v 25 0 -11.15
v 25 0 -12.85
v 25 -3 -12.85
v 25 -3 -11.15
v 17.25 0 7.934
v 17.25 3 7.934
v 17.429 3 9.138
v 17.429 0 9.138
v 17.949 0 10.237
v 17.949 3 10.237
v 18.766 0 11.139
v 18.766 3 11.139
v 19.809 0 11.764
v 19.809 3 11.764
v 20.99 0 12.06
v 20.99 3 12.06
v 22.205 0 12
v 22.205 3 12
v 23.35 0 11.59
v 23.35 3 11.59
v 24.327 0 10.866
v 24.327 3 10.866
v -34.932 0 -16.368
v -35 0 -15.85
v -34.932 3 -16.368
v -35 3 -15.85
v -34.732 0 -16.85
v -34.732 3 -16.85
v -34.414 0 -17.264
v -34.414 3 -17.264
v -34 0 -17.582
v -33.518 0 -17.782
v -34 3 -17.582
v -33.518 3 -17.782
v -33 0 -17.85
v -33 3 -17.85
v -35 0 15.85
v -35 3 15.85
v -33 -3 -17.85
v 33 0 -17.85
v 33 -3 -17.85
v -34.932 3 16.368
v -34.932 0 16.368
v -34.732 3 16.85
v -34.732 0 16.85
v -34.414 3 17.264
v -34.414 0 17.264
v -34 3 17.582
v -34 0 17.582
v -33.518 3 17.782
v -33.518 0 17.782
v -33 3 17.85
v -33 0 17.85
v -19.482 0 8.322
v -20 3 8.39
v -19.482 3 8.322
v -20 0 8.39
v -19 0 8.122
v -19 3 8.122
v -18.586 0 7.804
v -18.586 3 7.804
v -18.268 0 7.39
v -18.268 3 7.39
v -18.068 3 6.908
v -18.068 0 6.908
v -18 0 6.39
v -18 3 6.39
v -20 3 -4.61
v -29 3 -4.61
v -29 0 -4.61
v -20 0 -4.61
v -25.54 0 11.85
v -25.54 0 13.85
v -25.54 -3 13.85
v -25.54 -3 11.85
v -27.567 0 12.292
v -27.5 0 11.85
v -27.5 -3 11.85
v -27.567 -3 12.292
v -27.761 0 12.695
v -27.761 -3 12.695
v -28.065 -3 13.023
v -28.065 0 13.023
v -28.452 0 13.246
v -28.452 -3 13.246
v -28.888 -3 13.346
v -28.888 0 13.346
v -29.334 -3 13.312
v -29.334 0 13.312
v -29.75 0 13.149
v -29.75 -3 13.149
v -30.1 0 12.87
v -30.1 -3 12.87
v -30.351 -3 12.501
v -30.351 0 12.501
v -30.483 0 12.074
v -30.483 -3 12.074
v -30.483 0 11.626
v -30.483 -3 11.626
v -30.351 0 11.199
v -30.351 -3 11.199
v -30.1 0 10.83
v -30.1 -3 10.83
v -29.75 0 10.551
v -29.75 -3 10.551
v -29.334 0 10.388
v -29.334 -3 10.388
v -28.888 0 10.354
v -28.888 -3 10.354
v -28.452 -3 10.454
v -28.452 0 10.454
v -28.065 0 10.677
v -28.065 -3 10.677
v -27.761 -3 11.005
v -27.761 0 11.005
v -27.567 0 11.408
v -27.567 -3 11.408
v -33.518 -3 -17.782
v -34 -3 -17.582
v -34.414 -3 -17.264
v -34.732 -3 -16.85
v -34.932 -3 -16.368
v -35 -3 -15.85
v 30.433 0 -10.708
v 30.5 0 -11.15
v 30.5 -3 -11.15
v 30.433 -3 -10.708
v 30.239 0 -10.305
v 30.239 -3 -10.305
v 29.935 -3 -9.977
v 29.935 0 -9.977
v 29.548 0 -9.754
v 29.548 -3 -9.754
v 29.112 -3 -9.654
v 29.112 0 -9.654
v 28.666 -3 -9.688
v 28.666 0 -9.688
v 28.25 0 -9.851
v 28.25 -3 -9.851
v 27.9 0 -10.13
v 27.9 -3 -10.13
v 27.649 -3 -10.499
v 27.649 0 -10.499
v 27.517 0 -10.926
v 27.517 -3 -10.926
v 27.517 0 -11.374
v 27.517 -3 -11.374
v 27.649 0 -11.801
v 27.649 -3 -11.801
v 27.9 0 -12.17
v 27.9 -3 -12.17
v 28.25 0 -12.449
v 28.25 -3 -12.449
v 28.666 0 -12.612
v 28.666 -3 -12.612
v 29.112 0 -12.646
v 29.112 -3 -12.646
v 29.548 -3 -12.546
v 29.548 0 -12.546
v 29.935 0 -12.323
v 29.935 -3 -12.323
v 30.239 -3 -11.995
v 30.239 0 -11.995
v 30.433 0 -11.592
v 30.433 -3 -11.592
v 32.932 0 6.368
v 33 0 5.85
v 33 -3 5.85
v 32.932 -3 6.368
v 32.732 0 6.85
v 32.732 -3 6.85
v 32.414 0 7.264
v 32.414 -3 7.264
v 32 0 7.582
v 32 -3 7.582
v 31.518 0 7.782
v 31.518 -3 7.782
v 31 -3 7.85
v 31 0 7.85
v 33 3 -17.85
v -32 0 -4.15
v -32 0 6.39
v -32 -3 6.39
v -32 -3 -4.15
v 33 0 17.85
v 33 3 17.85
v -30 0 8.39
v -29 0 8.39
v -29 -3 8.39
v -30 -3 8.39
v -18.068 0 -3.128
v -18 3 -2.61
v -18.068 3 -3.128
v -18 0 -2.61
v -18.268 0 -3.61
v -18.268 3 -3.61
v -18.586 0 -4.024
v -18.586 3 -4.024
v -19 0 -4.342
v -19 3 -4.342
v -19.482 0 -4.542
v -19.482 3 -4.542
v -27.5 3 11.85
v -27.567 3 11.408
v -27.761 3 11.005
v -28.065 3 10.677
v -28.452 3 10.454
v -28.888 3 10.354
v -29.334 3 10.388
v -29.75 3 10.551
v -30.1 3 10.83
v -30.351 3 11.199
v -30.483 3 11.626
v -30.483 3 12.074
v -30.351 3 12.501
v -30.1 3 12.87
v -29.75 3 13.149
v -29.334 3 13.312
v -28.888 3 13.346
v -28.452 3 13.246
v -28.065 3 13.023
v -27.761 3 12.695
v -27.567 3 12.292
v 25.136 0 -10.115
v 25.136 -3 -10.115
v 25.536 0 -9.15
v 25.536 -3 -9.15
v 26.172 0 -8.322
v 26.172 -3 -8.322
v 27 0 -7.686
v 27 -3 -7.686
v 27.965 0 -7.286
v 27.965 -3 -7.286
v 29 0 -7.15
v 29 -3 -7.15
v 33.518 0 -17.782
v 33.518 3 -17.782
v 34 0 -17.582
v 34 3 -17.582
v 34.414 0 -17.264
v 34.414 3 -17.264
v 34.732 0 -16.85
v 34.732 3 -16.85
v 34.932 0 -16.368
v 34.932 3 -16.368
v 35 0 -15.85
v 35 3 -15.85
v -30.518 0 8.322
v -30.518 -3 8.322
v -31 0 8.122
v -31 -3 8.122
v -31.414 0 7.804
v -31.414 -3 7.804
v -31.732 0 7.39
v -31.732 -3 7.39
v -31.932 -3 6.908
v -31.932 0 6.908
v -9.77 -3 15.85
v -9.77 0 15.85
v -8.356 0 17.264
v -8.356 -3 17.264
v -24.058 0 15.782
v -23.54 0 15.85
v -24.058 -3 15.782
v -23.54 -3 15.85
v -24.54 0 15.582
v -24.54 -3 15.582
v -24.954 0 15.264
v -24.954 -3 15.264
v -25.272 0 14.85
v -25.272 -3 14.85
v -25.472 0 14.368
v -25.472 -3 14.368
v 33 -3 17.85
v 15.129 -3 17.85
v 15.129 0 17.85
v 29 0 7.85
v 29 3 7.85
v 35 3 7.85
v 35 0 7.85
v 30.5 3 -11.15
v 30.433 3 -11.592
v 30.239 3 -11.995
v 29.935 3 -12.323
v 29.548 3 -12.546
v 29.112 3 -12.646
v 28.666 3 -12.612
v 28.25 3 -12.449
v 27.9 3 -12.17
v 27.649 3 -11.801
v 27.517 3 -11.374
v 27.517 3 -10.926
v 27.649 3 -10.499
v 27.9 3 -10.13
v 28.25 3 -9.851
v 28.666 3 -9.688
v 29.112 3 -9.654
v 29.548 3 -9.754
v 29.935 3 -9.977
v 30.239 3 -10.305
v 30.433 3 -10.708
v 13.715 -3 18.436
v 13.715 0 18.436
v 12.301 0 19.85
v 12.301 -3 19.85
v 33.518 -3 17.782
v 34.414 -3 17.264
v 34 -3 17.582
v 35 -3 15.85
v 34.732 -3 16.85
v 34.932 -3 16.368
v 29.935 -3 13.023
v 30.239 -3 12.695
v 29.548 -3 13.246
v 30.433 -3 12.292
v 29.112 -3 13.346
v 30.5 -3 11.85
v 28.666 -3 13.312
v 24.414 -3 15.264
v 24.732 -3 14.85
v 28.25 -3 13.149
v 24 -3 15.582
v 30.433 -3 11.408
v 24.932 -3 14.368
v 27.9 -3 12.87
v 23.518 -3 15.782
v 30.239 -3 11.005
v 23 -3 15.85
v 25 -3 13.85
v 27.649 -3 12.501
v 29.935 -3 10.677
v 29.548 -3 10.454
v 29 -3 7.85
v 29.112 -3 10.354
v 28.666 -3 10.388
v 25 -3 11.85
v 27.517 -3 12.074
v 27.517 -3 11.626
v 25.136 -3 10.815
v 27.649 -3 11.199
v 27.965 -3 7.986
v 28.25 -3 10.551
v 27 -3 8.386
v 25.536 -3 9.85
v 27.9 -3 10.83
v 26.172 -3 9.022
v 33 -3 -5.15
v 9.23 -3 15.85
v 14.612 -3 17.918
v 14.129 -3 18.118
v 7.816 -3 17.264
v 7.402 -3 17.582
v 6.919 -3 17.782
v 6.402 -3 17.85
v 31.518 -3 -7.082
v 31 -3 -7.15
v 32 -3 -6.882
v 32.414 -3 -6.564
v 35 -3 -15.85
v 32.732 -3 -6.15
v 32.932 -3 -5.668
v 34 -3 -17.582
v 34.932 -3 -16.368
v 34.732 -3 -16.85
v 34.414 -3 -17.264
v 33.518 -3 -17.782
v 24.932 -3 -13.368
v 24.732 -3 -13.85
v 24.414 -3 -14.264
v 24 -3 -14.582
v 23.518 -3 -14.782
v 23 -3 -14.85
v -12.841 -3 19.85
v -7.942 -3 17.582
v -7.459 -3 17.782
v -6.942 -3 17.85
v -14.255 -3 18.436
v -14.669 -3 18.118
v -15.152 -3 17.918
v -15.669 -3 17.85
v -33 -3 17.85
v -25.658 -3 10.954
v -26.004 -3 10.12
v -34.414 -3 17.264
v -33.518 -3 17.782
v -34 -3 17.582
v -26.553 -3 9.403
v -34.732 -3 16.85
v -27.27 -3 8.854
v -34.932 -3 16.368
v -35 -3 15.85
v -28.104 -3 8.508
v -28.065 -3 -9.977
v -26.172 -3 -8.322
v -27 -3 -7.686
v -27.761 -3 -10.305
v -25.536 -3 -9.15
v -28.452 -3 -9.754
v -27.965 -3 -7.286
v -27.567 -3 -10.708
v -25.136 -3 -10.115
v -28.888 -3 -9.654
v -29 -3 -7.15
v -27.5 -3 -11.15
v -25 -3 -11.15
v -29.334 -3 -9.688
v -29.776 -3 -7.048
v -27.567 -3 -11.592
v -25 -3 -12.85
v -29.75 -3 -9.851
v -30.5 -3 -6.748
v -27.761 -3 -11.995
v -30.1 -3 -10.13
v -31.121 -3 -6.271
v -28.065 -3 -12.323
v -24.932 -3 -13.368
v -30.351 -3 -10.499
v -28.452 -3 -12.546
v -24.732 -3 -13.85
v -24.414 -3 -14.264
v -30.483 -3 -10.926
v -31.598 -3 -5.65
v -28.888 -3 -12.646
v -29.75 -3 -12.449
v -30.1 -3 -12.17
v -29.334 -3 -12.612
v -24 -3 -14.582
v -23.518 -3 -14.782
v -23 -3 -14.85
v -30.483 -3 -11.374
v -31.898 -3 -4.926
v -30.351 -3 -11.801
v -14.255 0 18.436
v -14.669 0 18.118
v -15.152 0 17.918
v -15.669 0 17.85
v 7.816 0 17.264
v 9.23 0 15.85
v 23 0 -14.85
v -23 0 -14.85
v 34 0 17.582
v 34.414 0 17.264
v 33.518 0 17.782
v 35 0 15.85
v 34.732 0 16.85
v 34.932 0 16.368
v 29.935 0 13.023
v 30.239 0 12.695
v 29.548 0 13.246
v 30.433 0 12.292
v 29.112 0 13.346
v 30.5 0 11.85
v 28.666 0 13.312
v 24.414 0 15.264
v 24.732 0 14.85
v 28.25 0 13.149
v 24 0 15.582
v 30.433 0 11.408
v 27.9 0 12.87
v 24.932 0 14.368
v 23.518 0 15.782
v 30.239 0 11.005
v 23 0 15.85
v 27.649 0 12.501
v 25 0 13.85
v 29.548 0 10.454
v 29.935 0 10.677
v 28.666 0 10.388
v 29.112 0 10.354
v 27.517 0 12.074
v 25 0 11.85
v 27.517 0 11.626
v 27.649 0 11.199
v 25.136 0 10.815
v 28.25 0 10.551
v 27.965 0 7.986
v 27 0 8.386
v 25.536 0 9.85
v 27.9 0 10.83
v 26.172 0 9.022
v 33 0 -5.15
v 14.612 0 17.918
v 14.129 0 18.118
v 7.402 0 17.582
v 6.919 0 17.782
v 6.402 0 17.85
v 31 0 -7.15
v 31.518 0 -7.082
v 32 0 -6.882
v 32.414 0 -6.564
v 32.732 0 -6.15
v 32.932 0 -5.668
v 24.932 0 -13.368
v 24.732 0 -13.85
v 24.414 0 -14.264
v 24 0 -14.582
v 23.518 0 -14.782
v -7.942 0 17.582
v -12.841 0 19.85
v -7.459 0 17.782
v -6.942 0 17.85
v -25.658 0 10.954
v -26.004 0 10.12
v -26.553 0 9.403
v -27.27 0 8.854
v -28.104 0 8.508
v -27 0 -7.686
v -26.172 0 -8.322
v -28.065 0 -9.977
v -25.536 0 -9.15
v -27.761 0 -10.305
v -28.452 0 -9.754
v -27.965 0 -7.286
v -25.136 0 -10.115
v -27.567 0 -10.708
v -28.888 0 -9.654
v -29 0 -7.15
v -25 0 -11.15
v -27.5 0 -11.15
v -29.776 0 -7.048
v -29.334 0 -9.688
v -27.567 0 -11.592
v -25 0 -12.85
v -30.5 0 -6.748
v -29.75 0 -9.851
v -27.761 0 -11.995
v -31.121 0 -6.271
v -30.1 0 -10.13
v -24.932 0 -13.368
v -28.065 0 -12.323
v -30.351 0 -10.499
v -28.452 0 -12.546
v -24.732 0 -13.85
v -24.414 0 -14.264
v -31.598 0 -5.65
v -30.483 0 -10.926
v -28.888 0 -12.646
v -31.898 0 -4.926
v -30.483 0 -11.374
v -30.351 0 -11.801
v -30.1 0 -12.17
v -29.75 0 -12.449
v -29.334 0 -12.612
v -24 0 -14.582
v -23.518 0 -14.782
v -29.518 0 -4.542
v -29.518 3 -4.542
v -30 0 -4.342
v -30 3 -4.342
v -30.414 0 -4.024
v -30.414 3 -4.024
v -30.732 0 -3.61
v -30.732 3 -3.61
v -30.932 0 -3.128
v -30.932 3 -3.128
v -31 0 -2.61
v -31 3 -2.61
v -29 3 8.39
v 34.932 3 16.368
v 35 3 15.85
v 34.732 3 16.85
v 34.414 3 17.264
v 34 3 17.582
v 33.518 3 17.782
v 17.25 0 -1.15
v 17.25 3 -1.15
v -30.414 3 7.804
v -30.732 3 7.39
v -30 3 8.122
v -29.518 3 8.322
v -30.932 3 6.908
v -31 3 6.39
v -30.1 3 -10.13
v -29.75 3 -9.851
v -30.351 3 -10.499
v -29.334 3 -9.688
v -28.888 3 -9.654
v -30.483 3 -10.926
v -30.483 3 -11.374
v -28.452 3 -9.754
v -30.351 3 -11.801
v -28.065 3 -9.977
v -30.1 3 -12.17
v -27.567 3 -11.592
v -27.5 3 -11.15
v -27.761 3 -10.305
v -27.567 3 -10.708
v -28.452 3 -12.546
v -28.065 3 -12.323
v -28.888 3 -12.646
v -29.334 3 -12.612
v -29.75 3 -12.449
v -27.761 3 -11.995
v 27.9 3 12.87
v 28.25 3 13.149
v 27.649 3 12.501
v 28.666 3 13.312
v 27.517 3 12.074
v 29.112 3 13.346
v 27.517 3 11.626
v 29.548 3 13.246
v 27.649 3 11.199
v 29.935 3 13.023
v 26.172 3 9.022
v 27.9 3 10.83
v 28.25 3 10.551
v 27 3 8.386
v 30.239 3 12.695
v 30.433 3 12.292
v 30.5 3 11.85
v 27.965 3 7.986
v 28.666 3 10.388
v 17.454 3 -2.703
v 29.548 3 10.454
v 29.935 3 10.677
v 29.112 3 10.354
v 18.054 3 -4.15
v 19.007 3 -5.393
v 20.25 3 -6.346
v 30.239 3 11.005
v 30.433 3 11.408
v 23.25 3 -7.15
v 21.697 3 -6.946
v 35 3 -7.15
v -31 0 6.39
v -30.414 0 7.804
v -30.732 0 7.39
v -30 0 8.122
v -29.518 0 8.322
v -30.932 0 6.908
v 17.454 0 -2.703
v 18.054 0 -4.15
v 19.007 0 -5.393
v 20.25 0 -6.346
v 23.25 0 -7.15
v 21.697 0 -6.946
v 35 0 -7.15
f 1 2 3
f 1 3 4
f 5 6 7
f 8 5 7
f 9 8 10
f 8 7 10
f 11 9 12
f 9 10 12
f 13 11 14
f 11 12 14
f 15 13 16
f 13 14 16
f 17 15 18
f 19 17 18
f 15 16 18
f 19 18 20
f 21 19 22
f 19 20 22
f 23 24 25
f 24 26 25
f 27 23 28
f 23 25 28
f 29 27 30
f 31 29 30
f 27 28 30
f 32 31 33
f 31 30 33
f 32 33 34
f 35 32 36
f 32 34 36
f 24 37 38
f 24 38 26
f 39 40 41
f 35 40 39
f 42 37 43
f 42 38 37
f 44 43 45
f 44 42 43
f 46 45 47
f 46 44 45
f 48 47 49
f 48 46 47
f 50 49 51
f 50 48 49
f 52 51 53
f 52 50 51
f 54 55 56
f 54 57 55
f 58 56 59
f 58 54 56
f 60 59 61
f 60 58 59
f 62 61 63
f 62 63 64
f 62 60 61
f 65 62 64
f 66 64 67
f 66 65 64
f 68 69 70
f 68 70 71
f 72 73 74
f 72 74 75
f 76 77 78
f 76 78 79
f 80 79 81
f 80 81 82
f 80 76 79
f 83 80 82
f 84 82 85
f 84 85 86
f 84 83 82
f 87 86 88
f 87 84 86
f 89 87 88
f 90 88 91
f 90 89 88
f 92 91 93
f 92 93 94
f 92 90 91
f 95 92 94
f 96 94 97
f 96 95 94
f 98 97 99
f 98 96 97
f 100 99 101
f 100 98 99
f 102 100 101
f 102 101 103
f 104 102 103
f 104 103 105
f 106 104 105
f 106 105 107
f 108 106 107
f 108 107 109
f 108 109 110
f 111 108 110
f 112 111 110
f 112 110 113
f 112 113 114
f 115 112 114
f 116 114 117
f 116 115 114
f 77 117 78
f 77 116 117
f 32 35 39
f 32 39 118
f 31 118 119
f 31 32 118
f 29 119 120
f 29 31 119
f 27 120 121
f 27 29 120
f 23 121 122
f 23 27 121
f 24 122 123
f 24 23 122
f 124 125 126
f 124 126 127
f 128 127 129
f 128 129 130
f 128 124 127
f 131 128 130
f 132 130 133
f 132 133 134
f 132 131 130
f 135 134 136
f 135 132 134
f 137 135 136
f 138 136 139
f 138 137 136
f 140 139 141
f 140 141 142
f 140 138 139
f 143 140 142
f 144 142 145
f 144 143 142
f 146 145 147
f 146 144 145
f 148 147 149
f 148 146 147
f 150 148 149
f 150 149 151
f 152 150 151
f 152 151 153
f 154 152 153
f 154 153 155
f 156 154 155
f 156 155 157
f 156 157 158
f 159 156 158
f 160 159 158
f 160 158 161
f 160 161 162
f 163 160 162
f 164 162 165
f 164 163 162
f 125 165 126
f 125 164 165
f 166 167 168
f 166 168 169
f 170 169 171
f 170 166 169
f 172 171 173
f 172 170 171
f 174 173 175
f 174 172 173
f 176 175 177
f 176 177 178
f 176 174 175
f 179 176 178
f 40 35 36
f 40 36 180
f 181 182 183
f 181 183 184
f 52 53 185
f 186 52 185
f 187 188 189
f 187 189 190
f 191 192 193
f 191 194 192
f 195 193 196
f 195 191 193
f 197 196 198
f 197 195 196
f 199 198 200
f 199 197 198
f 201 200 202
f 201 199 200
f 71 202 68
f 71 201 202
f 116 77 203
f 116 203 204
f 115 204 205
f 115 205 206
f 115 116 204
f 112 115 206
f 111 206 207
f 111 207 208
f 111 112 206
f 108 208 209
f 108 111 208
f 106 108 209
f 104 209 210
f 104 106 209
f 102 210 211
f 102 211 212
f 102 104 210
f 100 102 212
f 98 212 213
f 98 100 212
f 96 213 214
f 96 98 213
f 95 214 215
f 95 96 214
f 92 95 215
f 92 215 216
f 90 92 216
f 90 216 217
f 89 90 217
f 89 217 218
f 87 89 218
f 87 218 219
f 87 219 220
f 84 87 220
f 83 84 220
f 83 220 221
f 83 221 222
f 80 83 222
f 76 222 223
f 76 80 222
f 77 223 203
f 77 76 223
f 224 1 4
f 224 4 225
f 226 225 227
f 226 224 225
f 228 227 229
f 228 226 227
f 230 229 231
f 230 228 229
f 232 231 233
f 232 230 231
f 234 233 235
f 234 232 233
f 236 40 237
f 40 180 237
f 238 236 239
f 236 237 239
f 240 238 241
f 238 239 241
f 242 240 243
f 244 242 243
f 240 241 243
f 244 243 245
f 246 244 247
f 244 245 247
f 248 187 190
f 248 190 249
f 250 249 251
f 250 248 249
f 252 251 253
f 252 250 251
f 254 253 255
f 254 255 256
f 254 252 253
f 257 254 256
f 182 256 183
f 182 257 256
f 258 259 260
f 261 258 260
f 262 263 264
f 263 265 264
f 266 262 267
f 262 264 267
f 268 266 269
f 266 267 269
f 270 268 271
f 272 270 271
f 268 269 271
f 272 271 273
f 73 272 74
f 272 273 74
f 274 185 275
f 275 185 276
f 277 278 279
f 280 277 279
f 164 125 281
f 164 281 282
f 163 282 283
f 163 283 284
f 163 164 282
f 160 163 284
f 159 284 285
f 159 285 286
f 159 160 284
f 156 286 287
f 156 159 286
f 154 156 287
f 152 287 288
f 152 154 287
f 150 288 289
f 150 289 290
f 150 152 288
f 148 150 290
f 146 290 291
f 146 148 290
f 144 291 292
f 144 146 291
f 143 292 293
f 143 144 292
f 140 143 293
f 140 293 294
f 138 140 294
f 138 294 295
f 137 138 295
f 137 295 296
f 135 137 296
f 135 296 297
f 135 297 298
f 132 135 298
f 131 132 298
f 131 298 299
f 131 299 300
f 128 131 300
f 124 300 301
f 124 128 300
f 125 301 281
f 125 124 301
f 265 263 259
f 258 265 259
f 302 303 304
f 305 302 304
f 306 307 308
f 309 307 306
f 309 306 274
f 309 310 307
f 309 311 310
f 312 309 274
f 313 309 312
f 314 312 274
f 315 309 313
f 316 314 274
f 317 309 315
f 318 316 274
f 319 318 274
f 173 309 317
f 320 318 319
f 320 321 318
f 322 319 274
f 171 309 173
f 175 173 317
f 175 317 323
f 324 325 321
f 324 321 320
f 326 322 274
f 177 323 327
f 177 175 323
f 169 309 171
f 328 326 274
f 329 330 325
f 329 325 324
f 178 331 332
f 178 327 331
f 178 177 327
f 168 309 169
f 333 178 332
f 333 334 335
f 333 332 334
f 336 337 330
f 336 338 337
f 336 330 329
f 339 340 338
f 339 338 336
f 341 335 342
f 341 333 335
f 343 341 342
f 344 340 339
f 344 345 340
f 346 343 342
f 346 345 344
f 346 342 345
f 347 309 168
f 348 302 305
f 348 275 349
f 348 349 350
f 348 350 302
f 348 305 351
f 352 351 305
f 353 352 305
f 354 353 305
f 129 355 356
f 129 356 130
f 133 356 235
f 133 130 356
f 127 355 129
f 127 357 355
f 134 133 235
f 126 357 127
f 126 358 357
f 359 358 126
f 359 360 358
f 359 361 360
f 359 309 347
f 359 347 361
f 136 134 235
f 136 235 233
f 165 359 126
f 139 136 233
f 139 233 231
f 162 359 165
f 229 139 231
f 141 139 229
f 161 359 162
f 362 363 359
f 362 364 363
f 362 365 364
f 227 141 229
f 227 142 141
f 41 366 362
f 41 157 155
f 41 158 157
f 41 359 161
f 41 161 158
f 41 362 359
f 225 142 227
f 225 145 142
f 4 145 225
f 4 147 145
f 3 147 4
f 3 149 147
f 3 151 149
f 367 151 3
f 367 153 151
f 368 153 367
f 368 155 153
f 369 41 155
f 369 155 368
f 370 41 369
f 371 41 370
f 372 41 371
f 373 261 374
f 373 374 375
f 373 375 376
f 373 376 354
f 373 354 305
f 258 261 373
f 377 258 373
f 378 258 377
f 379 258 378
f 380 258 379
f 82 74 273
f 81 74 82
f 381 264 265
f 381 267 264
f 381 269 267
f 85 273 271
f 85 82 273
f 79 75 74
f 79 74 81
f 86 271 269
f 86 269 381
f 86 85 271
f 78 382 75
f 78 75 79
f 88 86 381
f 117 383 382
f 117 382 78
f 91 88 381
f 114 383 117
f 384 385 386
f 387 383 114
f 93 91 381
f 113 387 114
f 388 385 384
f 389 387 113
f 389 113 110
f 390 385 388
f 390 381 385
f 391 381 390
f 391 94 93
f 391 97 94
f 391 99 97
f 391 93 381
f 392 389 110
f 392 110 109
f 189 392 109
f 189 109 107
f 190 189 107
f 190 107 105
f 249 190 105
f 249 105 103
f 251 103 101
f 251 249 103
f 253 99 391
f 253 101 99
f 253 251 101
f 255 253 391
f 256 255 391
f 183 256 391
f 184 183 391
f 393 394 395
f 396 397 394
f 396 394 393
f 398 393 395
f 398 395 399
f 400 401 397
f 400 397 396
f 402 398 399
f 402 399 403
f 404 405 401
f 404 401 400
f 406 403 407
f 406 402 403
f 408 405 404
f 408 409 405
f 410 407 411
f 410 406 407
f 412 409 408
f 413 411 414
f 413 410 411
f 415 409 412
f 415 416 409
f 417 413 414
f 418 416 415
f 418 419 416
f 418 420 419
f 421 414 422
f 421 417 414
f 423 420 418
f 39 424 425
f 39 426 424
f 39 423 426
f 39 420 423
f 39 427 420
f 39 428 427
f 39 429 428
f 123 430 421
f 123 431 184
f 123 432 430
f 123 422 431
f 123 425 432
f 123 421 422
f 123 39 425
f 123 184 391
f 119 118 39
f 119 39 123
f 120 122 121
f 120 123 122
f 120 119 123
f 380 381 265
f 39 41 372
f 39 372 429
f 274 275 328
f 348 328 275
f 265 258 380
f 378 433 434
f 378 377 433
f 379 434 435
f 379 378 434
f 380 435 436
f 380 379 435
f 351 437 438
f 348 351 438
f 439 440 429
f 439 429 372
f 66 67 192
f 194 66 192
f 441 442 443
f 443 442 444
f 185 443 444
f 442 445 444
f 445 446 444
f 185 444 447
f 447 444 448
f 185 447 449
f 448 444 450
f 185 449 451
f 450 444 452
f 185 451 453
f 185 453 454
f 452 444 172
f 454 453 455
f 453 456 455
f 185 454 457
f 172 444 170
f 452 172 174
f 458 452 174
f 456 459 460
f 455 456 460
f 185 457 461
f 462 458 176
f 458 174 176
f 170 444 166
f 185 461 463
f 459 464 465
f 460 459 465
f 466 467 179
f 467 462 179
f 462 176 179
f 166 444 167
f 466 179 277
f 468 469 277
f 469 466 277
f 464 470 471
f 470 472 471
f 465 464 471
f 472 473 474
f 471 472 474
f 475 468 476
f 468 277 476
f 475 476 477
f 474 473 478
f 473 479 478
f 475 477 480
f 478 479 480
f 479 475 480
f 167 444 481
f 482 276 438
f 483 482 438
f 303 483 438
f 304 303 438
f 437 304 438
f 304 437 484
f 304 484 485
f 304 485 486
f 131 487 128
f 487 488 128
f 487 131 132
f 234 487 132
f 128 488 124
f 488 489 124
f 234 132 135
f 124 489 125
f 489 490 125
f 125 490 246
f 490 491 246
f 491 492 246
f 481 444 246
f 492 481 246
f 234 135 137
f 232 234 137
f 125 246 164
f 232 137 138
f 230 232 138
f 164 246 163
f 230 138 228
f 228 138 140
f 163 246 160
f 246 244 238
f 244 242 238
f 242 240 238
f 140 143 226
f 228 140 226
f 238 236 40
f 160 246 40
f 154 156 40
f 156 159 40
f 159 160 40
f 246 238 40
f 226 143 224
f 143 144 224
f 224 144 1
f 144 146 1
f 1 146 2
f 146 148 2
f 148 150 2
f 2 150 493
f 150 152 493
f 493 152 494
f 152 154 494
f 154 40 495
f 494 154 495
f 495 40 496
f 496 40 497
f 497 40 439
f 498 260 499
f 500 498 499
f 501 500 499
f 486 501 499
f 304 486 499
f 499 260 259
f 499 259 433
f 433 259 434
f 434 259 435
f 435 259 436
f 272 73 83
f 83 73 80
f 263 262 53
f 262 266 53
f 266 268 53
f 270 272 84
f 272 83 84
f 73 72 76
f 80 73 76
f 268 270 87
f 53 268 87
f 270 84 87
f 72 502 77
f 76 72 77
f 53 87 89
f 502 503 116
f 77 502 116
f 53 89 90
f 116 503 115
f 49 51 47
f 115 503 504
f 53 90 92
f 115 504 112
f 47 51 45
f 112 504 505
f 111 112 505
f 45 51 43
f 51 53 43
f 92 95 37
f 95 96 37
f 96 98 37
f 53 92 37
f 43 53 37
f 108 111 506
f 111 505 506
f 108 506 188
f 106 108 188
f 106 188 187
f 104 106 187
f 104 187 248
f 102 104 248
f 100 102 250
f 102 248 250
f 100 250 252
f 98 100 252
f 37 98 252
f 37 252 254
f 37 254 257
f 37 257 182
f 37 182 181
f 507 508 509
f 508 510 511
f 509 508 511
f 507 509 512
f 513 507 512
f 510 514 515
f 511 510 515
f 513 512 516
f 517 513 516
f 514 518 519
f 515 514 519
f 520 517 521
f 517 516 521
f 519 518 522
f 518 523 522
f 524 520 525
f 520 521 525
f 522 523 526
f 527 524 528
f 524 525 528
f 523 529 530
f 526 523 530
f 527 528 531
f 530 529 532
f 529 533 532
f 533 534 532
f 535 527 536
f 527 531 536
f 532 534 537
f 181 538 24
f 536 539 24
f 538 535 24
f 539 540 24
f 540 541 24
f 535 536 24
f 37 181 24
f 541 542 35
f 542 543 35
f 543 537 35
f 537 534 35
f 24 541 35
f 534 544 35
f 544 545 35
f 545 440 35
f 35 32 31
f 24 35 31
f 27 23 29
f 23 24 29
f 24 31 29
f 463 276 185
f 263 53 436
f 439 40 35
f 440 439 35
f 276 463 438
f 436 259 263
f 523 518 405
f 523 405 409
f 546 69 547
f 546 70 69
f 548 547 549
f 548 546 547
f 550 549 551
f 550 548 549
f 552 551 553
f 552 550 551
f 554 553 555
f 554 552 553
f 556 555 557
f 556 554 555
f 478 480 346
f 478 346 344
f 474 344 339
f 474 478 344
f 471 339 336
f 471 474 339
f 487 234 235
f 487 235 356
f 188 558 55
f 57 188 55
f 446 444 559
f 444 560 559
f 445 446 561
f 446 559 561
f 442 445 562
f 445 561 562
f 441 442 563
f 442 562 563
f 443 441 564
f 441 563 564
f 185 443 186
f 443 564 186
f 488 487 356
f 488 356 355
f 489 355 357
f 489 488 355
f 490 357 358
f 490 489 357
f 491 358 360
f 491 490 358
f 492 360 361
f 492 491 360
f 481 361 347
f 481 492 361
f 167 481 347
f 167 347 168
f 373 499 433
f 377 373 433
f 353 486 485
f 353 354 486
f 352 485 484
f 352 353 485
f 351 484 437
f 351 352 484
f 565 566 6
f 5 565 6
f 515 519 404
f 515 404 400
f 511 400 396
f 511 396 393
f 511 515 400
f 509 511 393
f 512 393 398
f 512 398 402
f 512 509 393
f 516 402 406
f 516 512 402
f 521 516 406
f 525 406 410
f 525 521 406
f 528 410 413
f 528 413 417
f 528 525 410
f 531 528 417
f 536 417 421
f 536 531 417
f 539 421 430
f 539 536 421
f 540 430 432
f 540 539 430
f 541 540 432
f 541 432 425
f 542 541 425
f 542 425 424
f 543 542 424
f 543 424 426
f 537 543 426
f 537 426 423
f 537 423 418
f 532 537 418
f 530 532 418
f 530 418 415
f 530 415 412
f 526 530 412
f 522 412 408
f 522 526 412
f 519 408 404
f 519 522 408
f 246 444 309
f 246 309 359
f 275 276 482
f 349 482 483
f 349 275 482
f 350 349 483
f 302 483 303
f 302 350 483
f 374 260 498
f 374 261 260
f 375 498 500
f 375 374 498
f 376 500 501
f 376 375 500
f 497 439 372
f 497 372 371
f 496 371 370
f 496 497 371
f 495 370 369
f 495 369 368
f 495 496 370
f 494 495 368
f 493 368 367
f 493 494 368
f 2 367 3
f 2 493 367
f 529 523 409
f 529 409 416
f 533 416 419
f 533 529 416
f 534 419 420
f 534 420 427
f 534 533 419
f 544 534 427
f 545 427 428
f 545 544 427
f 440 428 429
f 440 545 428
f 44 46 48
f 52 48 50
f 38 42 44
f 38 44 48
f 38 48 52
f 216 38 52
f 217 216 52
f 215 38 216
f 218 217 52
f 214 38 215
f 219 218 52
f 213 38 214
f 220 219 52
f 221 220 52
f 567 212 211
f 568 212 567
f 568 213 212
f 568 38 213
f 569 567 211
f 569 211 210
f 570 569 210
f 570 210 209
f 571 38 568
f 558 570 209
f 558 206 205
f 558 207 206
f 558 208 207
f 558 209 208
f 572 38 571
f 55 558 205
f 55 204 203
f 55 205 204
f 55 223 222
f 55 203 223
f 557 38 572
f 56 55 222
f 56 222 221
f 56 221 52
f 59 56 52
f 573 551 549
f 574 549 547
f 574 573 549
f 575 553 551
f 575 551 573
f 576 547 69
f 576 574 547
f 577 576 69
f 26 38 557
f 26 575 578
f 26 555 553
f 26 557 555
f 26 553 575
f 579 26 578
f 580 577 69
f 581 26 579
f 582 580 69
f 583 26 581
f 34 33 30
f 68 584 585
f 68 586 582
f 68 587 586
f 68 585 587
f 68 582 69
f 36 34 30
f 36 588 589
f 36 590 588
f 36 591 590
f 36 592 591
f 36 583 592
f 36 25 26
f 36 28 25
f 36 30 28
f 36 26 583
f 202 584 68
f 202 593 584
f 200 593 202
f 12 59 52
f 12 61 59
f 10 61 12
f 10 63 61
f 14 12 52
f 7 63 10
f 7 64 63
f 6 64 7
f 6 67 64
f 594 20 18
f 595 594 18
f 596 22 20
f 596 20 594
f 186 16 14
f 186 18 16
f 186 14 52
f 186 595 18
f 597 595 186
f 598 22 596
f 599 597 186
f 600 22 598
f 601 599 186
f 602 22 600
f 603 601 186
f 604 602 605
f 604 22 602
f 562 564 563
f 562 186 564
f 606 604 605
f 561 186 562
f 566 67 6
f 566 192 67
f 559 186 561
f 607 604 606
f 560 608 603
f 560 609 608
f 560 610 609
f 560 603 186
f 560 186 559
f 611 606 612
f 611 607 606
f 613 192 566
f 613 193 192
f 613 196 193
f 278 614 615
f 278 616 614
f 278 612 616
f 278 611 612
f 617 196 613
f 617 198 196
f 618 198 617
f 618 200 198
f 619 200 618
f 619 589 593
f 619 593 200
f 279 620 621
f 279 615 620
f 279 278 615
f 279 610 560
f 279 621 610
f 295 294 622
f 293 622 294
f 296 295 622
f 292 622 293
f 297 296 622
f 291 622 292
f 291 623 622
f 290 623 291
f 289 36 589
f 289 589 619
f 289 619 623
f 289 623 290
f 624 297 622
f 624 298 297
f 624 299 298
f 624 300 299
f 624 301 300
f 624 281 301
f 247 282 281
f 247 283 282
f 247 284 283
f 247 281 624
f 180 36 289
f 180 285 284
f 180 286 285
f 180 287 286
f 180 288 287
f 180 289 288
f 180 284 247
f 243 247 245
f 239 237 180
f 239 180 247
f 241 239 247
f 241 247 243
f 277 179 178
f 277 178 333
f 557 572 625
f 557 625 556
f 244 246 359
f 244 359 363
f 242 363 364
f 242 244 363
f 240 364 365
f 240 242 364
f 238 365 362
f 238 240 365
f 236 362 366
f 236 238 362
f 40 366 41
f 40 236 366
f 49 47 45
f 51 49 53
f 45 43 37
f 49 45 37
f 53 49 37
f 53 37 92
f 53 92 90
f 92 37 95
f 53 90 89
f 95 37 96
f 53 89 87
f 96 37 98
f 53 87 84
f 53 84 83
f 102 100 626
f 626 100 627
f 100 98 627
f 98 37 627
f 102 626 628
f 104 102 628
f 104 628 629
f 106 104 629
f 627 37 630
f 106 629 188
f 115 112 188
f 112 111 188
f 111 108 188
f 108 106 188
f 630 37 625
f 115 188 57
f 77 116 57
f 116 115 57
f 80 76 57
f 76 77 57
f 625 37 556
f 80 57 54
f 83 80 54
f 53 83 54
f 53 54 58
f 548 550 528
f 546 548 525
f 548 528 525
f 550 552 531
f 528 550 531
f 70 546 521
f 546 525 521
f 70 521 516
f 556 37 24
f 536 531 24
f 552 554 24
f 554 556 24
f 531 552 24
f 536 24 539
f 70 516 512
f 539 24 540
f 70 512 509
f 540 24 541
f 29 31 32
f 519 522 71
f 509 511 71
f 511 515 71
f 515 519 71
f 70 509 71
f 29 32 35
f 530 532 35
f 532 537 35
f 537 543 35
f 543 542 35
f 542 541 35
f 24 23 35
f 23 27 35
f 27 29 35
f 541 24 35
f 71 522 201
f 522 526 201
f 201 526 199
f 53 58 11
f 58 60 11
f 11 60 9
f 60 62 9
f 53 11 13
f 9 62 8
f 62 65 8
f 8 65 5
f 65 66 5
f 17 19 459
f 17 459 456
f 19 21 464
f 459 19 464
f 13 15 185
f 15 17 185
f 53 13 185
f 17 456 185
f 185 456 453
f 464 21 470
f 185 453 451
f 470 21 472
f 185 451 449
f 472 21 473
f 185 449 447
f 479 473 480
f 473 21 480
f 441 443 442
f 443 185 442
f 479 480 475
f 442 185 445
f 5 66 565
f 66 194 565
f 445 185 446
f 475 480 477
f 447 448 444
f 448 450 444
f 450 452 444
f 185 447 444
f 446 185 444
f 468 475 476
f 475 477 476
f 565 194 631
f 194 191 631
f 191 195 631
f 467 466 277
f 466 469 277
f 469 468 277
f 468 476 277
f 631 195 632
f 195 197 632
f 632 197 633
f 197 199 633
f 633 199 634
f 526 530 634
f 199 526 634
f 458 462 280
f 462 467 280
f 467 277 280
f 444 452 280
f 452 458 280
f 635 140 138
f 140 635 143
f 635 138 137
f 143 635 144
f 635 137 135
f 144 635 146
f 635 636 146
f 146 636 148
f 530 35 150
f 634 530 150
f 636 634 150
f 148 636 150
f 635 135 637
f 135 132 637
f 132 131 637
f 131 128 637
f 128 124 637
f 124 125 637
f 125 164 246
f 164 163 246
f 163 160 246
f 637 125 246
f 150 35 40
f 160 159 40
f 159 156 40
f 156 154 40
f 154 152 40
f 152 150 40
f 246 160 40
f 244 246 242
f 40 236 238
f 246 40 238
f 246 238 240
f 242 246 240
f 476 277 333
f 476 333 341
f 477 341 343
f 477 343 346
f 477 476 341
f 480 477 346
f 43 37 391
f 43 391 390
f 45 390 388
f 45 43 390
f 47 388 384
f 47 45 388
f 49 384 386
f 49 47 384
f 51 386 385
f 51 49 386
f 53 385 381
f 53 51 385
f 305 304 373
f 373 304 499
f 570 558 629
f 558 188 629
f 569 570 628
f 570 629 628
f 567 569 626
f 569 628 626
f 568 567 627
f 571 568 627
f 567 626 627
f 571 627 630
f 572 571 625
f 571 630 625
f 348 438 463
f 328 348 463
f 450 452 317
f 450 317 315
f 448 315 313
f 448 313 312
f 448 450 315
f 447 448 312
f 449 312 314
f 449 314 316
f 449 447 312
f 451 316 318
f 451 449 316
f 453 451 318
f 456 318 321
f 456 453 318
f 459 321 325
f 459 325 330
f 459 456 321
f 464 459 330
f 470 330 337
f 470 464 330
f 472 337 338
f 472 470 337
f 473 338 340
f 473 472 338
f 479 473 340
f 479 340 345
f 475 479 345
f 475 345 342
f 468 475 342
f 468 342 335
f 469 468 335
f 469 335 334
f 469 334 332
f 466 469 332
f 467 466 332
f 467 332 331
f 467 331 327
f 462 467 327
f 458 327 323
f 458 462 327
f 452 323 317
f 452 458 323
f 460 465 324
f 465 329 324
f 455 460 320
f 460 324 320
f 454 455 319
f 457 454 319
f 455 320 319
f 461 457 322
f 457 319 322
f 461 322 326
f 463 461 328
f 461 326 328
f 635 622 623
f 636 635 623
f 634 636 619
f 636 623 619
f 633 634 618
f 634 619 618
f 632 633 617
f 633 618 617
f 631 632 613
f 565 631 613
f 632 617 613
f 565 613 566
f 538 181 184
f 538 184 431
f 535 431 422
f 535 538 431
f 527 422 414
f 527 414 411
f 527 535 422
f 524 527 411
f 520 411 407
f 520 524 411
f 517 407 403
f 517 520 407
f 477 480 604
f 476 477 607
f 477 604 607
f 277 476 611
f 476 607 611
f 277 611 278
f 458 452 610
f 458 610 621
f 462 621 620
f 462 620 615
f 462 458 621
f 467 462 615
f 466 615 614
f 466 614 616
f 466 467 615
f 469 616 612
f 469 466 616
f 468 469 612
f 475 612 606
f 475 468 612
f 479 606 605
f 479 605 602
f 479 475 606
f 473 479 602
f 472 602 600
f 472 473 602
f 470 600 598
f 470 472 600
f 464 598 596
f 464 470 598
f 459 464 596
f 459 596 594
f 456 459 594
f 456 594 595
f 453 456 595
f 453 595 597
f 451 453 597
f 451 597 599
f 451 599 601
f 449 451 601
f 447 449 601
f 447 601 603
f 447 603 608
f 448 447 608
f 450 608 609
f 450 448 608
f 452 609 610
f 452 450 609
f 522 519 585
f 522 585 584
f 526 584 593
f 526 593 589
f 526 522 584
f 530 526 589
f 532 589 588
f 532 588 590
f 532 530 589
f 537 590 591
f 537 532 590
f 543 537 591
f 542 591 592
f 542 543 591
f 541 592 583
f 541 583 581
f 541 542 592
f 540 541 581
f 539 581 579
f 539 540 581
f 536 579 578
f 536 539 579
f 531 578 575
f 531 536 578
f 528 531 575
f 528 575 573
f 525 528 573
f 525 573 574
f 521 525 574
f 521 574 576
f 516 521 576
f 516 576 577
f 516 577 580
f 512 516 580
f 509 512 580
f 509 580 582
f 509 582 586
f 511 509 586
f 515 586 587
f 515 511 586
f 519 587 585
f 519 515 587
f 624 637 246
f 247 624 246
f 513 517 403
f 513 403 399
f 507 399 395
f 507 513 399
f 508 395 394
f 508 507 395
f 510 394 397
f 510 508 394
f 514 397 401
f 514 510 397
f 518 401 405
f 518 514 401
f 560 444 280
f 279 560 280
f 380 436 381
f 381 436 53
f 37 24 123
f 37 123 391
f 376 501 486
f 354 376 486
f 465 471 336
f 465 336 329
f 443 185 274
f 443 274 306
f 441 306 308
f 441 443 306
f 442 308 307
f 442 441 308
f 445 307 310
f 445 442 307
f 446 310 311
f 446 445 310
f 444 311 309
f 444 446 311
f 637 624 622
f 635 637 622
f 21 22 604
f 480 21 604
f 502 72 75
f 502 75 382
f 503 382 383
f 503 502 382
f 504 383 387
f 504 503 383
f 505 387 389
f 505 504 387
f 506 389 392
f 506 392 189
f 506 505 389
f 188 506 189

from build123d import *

# Parameters (mm, degrees)
SKETCH1_W           = 70
SKETCH1_H           = 35.7
SKETCH1_R           = 1.5
BOSS_EXTRUDE1_DEPTH = 3
SKETCH2_W           = 13
SKETCH2_H           = 13
CUT_EXTRUDE1_DEPTH  = 4
FILLET1_R           = 2
FILLET2_R           = 2
SKETCH3_R           = 1.5
BOSS_EXTRUDE2_DEPTH = 3
BOSS_EXTRUDE3_DEPTH = 3
FILLET3_R           = 2
FILLET4_R           = 2


with BuildPart() as part:
    # Sketch1 → Boss-Extrude1 (new body)
    with BuildSketch(Plane(origin=(0, 0, 0), x_dir=(1, 0, 0), z_dir=(0, 1, 0))):
        Rectangle(SKETCH1_W, SKETCH1_H)
        with Locations((-29, -11.85)):
            Circle(SKETCH1_R, mode=Mode.SUBTRACT)
        with Locations((29, -11.85)):
            Circle(SKETCH1_R, mode=Mode.SUBTRACT)
        with Locations((29, 11.15)):
            Circle(SKETCH1_R, mode=Mode.SUBTRACT)
        with Locations((-29, 11.15)):
            Circle(SKETCH1_R, mode=Mode.SUBTRACT)
    extrude(amount=BOSS_EXTRUDE1_DEPTH)

    # Sketch2 → Cut-Extrude1 (cut, through all)
    with BuildSketch(Plane(origin=(0, 3, 0), x_dir=(1, 0, 0), z_dir=(0, 1, 0))):
        with Locations((-24.5, -1.89)):
            Rectangle(SKETCH2_W, SKETCH2_H)
        with BuildLine():
            Line((17.25, 1.15), (17.25, -7.934129881))
            ThreePointArc((17.25, -7.934129881), (19.809314312, -11.764414428), (24.327442995, -10.865702756))
            Line((24.327442995, -10.865702756), (26.171572875, -9.021572875))
            ThreePointArc((26.171572875, -9.021572875), (27.469266271, -8.15448187), (29, -7.85))
            Line((29, -7.85), (35, -7.85))
            Line((35, -7.85), (35, 7.15))
            Line((35, 7.15), (23.25, 7.15))
            ThreePointArc((23.25, 7.15), (19.007359313, 5.392640687), (17.25, 1.15))
        make_face()
    extrude(amount=-CUT_EXTRUDE1_DEPTH, mode=Mode.SUBTRACT)

    # Fillet1
    fillet1_edges = [part.edges().sort_by_distance(p)[0] for p in [
        (-18, 1.5, -4.61),
        (-18, 1.5, 8.39),
        (-31, 1.5, 8.39),
        (-31, 1.5, -4.61),
    ]]
    fillet(fillet1_edges, radius=FILLET1_R)

    # Fillet2
    fillet2_edges = [part.edges().sort_by_distance(p)[0] for p in [
        (-35, 1.5, -17.85),
        (35, 1.5, -17.85),
        (35, 1.5, 17.85),
        (-35, 1.5, 17.85),
    ]]
    fillet(fillet2_edges, radius=FILLET2_R)


with BuildPart() as body_2:
    # Sketch3 → Boss-Extrude2 (new body)
    with BuildSketch(Plane.XZ):
        with BuildLine():
            Line((35, 15.85), (35, 7.85))
            Line((35, 7.85), (35, -7.15))
            Line((35, -7.15), (35, -15.85))
            ThreePointArc((35, -15.85), (34.414213562, -17.264213562), (33, -17.85))
            Line((33, -17.85), (-33, -17.85))
            ThreePointArc((-33, -17.85), (-34.414213562, -17.264213562), (-35, -15.85))
            Line((-35, -15.85), (-35, 15.85))
            ThreePointArc((-35, 15.85), (-34.414213562, 17.264213562), (-33, 17.85))
            Line((-33, 17.85), (-25.54, 17.85))
            Line((-25.54, 17.85), (-25.54, 11.85))
            ThreePointArc((-25.54, 11.85), (-26.553410537, 9.403410537), (-29, 8.39))
            Line((-29, 8.39), (-30, 8.39))
            ThreePointArc((-30, 8.39), (-31.414213562, 7.804213562), (-32, 6.39))
            Line((-32, 6.39), (-32, -4.15))
            ThreePointArc((-32, -4.15), (-31.121320344, -6.271320344), (-29, -7.15))
            ThreePointArc((-29, -7.15), (-26.171572875, -8.321572875), (-25, -11.15))
            Line((-25, -11.15), (-25, -12.85))
            ThreePointArc((-25, -12.85), (-24.414213562, -14.264213562), (-23, -14.85))
            Line((-23, -14.85), (23, -14.85))
            ThreePointArc((23, -14.85), (24.414213562, -14.264213562), (25, -12.85))
            Line((25, -12.85), (25, -11.15))
            ThreePointArc((25, -11.15), (26.171572875, -8.321572875), (29, -7.15))
            Line((29, -7.15), (31, -7.15))
            ThreePointArc((31, -7.15), (32.414213562, -6.564213562), (33, -5.15))
            Line((33, -5.15), (33, 5.85))
            ThreePointArc((33, 5.85), (32.414213562, 7.264213562), (31, 7.85))
            Line((31, 7.85), (29, 7.85))
            ThreePointArc((29, 7.85), (27.469266271, 8.15448187), (26.171572875, 9.021572875))
            ThreePointArc((26.171572875, 9.021572875), (25.30448187, 10.319266271), (25, 11.85))
            Line((25, 11.85), (25, 17.85))
            Line((25, 17.85), (33, 17.85))
            ThreePointArc((33, 17.85), (34.414213562, 17.264213562), (35, 15.85))
        make_face()
        with Locations((-29, 11.85)):
            Circle(SKETCH3_R, mode=Mode.SUBTRACT)
        with Locations((-29, -11.15)):
            Circle(SKETCH3_R, mode=Mode.SUBTRACT)
        with Locations((29, -11.15)):
            Circle(SKETCH3_R, mode=Mode.SUBTRACT)
        with Locations((29, 11.85)):
            Circle(SKETCH3_R, mode=Mode.SUBTRACT)
    extrude(amount=BOSS_EXTRUDE2_DEPTH)

    # Sketch4 → Boss-Extrude3 (add)
    with BuildSketch(Plane(origin=(0, 0, 0), x_dir=(1, 0, 0), z_dir=(0, 1, 0))):
        Polygon((-25.54, -15.85), (-9.77, -15.85), (-7.77, -17.85), (7.23, -17.85), (9.23, -15.85), (25, -15.85), (25, -17.85), (14.301067812, -17.85), (12.301067812, -19.85), (-12.841067812, -19.85), (-14.841067812, -17.85), (-25.54, -17.85), align=None)
    extrude(amount=-BOSS_EXTRUDE3_DEPTH)

    # Fillet3
    fillet3_edges = [body_2.edges().sort_by_distance(p)[0] for p in [
        (-25.54, -1.5, 15.85),
        (25, -1.5, 15.85),
    ]]
    fillet(fillet3_edges, radius=FILLET3_R)

    # Fillet4
    fillet4_edges = [body_2.edges().sort_by_distance(p)[0] for p in [
        (-7.77, -1.5, 17.85),
        (7.23, -1.5, 17.85),
        (14.301067812, -1.5, 17.85),
        (-14.841067812, -1.5, 17.85),
    ]]
    fillet(fillet4_edges, radius=FILLET4_R)


solid = Compound([part.part, body_2.part])
